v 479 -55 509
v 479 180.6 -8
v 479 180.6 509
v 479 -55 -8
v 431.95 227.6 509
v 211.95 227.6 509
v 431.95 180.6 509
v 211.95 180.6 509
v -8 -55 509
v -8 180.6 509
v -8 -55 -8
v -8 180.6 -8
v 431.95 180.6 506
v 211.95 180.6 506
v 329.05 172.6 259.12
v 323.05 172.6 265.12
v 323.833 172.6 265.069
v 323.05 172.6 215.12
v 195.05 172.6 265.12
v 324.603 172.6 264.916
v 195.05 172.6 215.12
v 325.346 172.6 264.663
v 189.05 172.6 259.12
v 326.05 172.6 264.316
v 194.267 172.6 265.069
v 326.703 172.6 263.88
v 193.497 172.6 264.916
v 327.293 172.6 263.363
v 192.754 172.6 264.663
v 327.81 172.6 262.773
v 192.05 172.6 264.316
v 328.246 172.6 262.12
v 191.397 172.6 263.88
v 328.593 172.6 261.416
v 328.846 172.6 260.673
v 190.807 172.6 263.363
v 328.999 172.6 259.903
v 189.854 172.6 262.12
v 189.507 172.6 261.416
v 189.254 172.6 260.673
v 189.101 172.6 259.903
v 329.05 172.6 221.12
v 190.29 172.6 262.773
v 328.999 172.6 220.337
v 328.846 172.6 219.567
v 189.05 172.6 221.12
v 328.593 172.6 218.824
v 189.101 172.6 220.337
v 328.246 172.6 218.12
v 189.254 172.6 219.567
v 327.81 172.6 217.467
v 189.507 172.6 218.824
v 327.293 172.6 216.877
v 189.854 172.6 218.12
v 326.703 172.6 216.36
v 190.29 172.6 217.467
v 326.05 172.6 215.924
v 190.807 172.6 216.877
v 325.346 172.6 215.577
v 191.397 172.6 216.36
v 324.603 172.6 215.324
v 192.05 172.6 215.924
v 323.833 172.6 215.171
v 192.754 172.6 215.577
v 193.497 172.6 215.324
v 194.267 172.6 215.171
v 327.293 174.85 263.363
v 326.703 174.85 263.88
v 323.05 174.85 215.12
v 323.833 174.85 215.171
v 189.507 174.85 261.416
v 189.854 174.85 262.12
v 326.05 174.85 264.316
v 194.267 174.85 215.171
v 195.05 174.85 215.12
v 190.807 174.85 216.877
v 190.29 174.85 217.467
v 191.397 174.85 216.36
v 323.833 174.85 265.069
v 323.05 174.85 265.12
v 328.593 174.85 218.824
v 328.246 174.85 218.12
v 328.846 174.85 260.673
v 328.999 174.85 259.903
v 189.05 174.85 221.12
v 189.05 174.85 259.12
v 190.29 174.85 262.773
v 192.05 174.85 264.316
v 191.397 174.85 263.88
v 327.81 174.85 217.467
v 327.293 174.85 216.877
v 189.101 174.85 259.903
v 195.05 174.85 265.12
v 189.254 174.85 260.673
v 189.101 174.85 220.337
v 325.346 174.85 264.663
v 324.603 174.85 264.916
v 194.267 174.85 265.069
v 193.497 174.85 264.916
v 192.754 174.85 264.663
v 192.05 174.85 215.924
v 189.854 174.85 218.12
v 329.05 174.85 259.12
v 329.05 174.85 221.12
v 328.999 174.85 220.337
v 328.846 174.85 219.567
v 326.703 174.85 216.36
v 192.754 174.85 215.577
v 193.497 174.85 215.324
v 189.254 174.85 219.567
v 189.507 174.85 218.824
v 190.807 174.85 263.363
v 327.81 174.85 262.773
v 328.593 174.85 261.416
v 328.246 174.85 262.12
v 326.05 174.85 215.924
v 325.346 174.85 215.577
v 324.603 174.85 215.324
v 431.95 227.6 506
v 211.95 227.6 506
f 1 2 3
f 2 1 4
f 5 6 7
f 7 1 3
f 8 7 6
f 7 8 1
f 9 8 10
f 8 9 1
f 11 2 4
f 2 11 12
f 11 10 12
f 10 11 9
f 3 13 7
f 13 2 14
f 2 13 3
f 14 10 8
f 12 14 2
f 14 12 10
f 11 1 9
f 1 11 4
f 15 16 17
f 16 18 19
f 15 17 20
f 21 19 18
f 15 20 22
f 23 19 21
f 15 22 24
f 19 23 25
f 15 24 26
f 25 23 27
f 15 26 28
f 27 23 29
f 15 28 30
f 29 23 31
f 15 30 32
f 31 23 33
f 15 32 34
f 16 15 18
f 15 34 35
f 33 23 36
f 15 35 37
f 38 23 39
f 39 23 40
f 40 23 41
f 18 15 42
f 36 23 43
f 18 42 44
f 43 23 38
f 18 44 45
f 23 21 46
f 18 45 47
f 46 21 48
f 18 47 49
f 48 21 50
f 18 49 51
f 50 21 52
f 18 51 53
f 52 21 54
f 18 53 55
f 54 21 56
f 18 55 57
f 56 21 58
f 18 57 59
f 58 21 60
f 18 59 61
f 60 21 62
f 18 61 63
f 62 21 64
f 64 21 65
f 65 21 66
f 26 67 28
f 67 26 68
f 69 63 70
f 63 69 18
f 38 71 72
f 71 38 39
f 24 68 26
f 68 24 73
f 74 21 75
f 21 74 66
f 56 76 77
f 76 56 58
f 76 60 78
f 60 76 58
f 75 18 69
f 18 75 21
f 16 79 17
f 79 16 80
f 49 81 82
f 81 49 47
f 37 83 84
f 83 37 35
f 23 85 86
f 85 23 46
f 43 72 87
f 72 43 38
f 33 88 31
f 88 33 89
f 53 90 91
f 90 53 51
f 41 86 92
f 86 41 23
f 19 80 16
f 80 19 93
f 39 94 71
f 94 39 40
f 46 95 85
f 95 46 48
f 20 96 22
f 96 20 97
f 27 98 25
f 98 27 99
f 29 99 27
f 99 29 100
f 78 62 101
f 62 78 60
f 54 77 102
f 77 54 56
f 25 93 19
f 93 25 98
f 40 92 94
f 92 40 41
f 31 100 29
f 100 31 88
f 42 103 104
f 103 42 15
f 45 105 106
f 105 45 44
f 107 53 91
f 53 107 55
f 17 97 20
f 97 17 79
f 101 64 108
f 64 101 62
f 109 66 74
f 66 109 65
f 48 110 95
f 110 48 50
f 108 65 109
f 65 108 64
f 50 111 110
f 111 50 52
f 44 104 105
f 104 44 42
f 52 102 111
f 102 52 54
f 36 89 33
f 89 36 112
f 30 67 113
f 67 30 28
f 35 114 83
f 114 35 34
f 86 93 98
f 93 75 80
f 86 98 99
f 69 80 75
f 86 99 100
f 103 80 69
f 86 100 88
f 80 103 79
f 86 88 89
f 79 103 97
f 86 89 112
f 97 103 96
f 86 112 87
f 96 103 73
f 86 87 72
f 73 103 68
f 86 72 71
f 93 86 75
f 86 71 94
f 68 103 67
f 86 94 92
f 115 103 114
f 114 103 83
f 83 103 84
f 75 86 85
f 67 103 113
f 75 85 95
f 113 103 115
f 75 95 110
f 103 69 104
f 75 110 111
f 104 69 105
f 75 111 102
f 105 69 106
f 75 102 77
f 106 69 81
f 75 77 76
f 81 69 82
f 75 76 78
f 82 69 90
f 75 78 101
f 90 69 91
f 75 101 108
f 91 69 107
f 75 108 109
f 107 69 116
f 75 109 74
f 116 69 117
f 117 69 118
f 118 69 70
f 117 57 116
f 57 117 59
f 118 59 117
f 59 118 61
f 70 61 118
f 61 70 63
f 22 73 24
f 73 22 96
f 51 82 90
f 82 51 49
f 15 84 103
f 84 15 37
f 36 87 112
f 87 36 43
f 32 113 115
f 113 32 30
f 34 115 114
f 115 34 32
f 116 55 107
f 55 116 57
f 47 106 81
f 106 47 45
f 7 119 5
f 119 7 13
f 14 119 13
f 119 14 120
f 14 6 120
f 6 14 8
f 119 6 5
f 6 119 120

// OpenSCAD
// file: ../lib/measured-params.scad
// Working measured-parameter file.
// Replace zeros with actual bench data as it becomes available.
// Keep uncertain values at 0 until they are measured cleanly.

use_measured_params = true;

// Global envelope
measured_chassis_height_no_feet = 414.0;
measured_chassis_height_with_feet = 416.9;
measured_chassis_width = 172.6;
measured_chassis_depth = 471.0;

// OEM interface
measured_lower_rail_length = 0;
measured_lower_rail_lip_depth = 0;
measured_lower_rail_groove_width = 0;
measured_lower_rail_z_offset = 0;
measured_lower_rail_thickness = 0;

measured_latch_x = 0;
measured_latch_z = 0;
measured_latch_depth = 0;
measured_latch_feature_width = 0;

measured_rear_hook_depth = 0;

// GPU envelope
measured_gpu_side_plane_overhang = 0;
measured_gpu_length = 0;
measured_gpu_height = 0;
measured_gpu_thickness = 0;
measured_gpu_connector_protrusion = 0;

// Cable bundle
measured_bundle_width = 0;
measured_bundle_height = 0;
measured_largest_connector_diagonal = 0;
measured_preferred_cable_opening_x = 0;
measured_preferred_cable_opening_z = 0;

// PSU relationship
measured_psu_offset_y = 0;
measured_psu_position_x = 0;
measured_psu_height_z = 0;
// file: ../lib/project-config.scad
// Chassis reference dimensions from Dell documentation.
// Replace with measured values once the local chassis is captured.

chassis_width = 172.6;
chassis_depth = 471.0;
chassis_height = 414.0;

// Planning-only parameters. These are not validated geometry.
top_hat_wall = 1.5;
top_hat_clearance = 8.0;
top_hat_extra_height = 95.0;
top_hat_extra_width = 55.0;

cable_opening_width = 140.0;
cable_opening_height = 50.0;
cable_opening_corner_radius = 6.0;

psu_shelf_width = 160.0;
psu_shelf_depth = 220.0;
psu_shelf_thickness = 3.0;
// main file
include <../lib/project-config.scad>;
include <../lib/measured-params.scad>;

$fn = 48;
render_mode = is_undef(render_mode) ? "concept" : render_mode;

function measured_or_default(measured_value, default_value) =
    (use_measured_params && measured_value > 0) ? measured_value : default_value;

chassis_depth_actual = measured_or_default(measured_chassis_depth, chassis_depth);
chassis_width_actual = measured_or_default(measured_chassis_width, chassis_width);
chassis_height_actual = measured_or_default(measured_chassis_height_no_feet, chassis_height);

// Coordinate system:
// X = front to rear
// Y = left side outward from the chassis wall
// Z = bottom to top

module chassis_reference() {
    color([0.7, 0.7, 0.7, 0.15])
        cube([chassis_depth_actual, chassis_width_actual, chassis_height_actual]);
}

module cable_opening_reference() {
    translate([
        measured_or_default(measured_preferred_cable_opening_x, chassis_depth_actual * 0.55),
        chassis_width_actual + top_hat_wall / 2,
        measured_or_default(measured_preferred_cable_opening_z, chassis_height_actual * 0.58)
    ])
    rotate([90, 0, 0])
        linear_extrude(height = top_hat_wall * 2, center = true)
            offset(r = cable_opening_corner_radius)
                square([
                    cable_opening_width - 2 * cable_opening_corner_radius,
                    cable_opening_height - 2 * cable_opening_corner_radius
                ], center = true);
}

module top_hat_shell_concept() {
    difference() {
        translate([
            -top_hat_clearance,
            -top_hat_extra_width,
            -top_hat_clearance
        ])
            cube([
                chassis_depth_actual + top_hat_clearance * 2,
                chassis_width_actual + top_hat_extra_width + top_hat_clearance,
                chassis_height_actual + top_hat_extra_height + top_hat_clearance
            ]);

        translate([0, 0, 0])
            cube([chassis_depth_actual, chassis_width_actual, chassis_height_actual]);

        cable_opening_reference();
    }
}

module psu_shelf_reference() {
    color([0.85, 0.45, 0.15, 0.7])
        translate([
            measured_or_default(measured_psu_position_x, chassis_depth_actual * 0.45),
            chassis_width_actual + top_hat_extra_width - psu_shelf_width,
            measured_or_default(measured_psu_height_z, chassis_height_actual + top_hat_extra_height - psu_shelf_thickness)
        ])
            cube([psu_shelf_depth, psu_shelf_width, psu_shelf_thickness]);
}

module concept_assembly() {
    chassis_reference();
    color([0.2, 0.45, 0.8, 0.2]) top_hat_shell_concept();
    psu_shelf_reference();
}

if (render_mode == "concept") {
    concept_assembly();
}
